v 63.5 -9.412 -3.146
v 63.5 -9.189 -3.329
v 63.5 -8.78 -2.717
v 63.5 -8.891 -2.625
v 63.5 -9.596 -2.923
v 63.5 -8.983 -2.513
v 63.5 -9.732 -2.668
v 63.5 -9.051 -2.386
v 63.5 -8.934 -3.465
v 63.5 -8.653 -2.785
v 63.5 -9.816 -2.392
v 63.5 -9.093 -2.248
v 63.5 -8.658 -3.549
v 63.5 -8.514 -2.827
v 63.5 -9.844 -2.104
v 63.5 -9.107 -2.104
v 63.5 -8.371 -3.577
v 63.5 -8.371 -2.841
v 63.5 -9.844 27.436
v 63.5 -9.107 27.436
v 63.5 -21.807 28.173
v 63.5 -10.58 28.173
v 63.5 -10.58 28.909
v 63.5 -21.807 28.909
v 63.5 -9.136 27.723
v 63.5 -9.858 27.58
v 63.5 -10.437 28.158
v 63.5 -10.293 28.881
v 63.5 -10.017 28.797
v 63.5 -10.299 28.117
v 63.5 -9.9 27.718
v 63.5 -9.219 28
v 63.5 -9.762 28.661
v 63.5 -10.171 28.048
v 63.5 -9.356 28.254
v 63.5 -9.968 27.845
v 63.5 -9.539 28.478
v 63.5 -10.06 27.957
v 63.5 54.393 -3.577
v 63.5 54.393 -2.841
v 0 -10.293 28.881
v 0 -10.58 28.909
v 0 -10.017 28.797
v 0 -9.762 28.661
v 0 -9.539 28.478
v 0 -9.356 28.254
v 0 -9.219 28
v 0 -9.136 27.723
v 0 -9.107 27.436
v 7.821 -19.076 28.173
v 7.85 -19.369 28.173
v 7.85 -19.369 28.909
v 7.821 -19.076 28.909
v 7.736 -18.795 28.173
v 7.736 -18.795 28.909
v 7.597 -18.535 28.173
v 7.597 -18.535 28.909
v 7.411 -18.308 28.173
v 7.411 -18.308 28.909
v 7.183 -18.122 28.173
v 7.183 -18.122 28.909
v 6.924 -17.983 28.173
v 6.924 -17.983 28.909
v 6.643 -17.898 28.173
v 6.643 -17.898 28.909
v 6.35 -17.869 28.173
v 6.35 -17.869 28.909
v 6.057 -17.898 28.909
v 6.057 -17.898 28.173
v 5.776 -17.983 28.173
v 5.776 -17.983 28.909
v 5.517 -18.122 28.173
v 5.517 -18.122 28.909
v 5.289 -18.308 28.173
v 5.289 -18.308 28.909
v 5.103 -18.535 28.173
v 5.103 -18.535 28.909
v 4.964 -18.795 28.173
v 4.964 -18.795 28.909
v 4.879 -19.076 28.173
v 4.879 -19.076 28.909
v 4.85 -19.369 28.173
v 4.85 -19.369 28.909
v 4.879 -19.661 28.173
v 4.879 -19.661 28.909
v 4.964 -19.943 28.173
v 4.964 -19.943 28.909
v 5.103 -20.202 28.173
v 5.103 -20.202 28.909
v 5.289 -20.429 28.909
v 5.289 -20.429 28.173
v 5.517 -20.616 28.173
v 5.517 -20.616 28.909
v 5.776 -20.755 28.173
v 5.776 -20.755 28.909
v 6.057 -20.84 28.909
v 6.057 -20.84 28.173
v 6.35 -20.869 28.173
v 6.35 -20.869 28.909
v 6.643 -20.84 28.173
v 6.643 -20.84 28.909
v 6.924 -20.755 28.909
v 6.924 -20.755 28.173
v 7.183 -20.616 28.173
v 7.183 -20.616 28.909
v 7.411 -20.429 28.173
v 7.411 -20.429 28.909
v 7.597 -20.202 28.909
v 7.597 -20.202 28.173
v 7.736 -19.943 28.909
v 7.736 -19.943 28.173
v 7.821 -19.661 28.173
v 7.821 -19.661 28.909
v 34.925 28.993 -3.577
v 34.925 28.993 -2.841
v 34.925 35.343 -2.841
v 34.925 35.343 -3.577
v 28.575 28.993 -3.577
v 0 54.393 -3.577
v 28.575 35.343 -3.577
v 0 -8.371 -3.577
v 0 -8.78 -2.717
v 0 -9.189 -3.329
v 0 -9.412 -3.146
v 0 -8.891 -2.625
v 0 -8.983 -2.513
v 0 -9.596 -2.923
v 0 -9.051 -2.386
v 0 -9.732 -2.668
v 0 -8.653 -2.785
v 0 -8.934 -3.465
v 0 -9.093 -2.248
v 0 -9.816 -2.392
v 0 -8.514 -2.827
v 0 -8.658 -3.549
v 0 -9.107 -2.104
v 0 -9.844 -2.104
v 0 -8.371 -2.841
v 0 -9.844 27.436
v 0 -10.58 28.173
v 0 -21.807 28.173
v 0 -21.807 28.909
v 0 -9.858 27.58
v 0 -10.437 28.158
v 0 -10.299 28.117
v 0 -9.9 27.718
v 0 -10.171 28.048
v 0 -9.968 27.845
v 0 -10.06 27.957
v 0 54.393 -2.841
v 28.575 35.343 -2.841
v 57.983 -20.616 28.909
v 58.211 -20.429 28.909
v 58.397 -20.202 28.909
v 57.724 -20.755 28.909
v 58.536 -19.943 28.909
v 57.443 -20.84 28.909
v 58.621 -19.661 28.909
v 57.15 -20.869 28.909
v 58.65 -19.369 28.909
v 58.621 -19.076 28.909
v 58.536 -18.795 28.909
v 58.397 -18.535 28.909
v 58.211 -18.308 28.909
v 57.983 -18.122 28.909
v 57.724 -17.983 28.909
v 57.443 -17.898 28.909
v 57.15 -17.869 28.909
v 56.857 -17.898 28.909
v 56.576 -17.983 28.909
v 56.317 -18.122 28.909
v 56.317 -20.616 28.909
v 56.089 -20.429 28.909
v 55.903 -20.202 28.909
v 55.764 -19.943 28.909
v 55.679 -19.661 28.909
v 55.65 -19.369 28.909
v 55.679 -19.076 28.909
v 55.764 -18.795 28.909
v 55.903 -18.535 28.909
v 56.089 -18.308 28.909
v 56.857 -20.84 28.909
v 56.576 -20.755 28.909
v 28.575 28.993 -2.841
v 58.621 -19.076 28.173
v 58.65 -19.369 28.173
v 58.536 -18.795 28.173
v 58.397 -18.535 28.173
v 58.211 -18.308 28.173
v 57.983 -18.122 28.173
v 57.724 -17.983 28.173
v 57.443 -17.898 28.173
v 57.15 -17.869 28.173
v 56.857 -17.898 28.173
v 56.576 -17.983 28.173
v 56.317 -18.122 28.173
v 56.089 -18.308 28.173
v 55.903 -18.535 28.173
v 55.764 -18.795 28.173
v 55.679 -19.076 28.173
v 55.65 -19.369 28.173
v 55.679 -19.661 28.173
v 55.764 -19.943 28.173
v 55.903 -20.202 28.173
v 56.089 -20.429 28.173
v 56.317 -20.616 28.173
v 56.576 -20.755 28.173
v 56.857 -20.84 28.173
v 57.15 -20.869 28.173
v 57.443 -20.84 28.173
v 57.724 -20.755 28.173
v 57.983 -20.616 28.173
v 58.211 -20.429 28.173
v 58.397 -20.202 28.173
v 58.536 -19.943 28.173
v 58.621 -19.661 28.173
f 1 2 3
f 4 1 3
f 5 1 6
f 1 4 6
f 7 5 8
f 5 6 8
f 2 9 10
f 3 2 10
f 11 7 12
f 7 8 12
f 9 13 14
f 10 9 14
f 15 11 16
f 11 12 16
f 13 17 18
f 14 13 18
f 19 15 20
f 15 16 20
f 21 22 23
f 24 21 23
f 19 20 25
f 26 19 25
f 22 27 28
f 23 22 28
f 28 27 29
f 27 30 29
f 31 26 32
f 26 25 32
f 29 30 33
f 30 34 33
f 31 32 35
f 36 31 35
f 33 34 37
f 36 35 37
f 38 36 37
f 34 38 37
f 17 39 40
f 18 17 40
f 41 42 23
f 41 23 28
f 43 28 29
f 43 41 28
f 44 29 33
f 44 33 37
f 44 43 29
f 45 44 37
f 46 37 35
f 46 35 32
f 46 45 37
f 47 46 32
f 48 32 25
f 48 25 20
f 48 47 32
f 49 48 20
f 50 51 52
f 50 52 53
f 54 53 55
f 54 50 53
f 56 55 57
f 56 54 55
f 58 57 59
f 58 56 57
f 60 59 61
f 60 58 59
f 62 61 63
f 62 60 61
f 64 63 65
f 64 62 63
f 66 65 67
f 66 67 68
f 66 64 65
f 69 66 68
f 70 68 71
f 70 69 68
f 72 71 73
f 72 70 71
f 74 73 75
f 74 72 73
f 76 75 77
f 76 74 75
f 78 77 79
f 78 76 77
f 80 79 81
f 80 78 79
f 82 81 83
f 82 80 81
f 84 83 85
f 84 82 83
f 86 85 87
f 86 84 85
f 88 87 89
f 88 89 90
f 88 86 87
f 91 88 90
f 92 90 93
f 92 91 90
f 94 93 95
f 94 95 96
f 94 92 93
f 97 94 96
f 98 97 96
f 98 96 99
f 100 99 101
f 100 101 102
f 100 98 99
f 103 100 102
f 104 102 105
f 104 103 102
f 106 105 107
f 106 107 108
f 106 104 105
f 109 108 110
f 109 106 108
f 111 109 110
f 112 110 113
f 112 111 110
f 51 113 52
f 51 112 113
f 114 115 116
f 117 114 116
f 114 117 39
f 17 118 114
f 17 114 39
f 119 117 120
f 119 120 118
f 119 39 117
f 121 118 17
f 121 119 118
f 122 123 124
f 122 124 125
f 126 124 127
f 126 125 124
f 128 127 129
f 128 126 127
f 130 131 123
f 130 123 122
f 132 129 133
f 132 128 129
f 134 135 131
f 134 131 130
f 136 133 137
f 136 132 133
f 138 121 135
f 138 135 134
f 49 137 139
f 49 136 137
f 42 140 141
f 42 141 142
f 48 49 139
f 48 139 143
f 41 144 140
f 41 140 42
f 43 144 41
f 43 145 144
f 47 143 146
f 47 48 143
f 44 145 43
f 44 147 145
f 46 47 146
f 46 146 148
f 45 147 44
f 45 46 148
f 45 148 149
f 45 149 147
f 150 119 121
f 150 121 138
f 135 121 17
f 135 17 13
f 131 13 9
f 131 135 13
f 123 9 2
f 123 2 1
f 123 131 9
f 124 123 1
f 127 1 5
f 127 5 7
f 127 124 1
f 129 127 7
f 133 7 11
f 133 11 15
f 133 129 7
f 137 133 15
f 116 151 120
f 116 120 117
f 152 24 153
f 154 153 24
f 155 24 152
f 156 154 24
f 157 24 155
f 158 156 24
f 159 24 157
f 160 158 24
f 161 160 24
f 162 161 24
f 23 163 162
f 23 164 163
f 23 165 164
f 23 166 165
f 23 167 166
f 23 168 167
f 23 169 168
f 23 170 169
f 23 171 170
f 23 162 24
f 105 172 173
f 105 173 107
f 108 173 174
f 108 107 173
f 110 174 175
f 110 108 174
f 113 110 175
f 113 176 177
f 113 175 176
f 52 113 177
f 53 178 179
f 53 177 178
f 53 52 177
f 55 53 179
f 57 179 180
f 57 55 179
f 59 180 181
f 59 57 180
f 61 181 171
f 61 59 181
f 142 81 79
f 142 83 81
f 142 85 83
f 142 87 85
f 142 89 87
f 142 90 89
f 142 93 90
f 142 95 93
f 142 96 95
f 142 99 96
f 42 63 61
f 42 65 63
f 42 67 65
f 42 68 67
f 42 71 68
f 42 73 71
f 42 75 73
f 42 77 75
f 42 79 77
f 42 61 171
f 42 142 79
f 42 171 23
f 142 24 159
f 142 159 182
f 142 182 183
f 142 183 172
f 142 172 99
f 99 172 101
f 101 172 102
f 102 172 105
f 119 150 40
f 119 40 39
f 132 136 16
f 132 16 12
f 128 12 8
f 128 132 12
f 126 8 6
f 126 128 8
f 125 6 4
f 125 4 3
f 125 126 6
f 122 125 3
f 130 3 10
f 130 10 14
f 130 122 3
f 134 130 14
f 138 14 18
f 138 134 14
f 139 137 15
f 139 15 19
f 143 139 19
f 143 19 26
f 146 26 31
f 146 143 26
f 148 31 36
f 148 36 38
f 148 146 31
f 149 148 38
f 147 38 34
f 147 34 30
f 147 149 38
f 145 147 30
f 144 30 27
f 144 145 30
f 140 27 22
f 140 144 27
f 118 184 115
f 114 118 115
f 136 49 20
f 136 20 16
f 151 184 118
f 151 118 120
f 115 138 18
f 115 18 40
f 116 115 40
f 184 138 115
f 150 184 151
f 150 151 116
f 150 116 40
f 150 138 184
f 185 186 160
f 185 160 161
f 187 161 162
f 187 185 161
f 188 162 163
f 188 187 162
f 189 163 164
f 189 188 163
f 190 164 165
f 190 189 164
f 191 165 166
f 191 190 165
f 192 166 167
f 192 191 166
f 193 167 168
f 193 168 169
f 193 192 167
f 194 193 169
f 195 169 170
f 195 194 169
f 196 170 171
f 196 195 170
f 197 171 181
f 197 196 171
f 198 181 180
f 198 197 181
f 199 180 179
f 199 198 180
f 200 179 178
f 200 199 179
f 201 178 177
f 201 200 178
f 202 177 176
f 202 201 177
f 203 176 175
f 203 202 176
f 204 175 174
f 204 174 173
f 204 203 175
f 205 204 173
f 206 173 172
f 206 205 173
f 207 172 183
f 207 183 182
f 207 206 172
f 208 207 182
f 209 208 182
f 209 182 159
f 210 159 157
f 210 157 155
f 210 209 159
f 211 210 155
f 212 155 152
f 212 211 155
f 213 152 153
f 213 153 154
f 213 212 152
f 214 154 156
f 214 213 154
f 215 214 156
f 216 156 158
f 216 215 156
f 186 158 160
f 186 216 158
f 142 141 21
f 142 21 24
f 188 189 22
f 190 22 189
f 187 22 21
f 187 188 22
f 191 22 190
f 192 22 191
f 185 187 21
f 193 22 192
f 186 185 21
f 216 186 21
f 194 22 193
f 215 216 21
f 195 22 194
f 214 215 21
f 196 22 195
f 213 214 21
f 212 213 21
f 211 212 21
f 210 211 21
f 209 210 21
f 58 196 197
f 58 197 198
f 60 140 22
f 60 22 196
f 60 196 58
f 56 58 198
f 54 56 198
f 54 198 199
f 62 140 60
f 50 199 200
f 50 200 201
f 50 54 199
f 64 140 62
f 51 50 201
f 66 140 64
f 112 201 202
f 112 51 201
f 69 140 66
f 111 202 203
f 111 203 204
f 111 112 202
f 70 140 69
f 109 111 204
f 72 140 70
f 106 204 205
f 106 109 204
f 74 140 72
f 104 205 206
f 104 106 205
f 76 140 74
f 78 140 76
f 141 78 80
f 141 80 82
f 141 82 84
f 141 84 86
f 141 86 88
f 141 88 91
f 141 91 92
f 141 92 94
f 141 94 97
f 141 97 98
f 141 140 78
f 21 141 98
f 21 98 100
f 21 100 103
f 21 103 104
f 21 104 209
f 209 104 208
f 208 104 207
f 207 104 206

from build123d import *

# Parameters (mm, degrees)
BASE_FLANGE1_DEPTH = 63.5
HOLE1_START        = 28.172610526
HOLE1_OUTLINE_R    = 1.5
HOLE1_DEPTH        = 0.7366
SKETCH8_W          = 6.35
SKETCH8_H          = 6.35
CUT_EXTRUDE1_DEPTH = 90.436486872


# Read off the part's stored shape, not the designer's step: Hole1
# Sheet-metal steps are written as plain solids
with BuildPart() as part:
    # Sketch2 → Base-Flange1 (new body)
    with BuildSketch(Plane(origin=(0, 0, 0), x_dir=(0, 0, -1), z_dir=(1, 0, 0))):
        with BuildLine():
            Line((-28.909210526, -21.807236842), (-28.909210526, -10.580436842))
            ThreePointArc((-28.909210526, -10.580436842), (-28.477720236, -9.538727132), (-27.436010526, -9.107236842))
            Line((-27.436010526, -9.107236842), (2.104189474, -9.107236842))
            ThreePointArc((2.104189474, -9.107236842), (2.625044329, -8.891491697), (2.840789474, -8.370636842))
            Line((2.840789474, -8.370636842), (2.840789474, 54.392763158))
            Line((2.840789474, 54.392763158), (3.577389474, 54.392763158))
            Line((3.577389474, 54.392763158), (3.577389474, -8.370636842))
            ThreePointArc((3.577389474, -8.370636842), (3.145899184, -9.412346552), (2.104189474, -9.843836842))
            Line((2.104189474, -9.843836842), (-27.436010526, -9.843836842))
            ThreePointArc((-27.436010526, -9.843836842), (-27.956865381, -10.059581987), (-28.172610526, -10.580436842))
            Line((-28.172610526, -10.580436842), (-28.172610526, -21.807236842))
            Line((-28.172610526, -21.807236842), (-28.909210526, -21.807236842))
        make_face()
    extrude(amount=BASE_FLANGE1_DEPTH)

    # Hole1 outline → Hole1 (cut)
    with BuildSketch(Plane.XY.offset(HOLE1_START)):
        with Locations((6.35, -19.368836842)):
            Circle(HOLE1_OUTLINE_R)
        with Locations((57.15, -19.368836842)):
            Circle(HOLE1_OUTLINE_R)
    extrude(amount=HOLE1_DEPTH, mode=Mode.SUBTRACT)

    # Sketch8 → Cut-Extrude1 (cut, through all)
    with BuildSketch(Plane.XY.offset(-2.840789474)):
        with Locations((31.75, 32.167763158)):
            Rectangle(SKETCH8_W, SKETCH8_H)
    extrude(amount=-CUT_EXTRUDE1_DEPTH, mode=Mode.SUBTRACT)


solid = part.part
